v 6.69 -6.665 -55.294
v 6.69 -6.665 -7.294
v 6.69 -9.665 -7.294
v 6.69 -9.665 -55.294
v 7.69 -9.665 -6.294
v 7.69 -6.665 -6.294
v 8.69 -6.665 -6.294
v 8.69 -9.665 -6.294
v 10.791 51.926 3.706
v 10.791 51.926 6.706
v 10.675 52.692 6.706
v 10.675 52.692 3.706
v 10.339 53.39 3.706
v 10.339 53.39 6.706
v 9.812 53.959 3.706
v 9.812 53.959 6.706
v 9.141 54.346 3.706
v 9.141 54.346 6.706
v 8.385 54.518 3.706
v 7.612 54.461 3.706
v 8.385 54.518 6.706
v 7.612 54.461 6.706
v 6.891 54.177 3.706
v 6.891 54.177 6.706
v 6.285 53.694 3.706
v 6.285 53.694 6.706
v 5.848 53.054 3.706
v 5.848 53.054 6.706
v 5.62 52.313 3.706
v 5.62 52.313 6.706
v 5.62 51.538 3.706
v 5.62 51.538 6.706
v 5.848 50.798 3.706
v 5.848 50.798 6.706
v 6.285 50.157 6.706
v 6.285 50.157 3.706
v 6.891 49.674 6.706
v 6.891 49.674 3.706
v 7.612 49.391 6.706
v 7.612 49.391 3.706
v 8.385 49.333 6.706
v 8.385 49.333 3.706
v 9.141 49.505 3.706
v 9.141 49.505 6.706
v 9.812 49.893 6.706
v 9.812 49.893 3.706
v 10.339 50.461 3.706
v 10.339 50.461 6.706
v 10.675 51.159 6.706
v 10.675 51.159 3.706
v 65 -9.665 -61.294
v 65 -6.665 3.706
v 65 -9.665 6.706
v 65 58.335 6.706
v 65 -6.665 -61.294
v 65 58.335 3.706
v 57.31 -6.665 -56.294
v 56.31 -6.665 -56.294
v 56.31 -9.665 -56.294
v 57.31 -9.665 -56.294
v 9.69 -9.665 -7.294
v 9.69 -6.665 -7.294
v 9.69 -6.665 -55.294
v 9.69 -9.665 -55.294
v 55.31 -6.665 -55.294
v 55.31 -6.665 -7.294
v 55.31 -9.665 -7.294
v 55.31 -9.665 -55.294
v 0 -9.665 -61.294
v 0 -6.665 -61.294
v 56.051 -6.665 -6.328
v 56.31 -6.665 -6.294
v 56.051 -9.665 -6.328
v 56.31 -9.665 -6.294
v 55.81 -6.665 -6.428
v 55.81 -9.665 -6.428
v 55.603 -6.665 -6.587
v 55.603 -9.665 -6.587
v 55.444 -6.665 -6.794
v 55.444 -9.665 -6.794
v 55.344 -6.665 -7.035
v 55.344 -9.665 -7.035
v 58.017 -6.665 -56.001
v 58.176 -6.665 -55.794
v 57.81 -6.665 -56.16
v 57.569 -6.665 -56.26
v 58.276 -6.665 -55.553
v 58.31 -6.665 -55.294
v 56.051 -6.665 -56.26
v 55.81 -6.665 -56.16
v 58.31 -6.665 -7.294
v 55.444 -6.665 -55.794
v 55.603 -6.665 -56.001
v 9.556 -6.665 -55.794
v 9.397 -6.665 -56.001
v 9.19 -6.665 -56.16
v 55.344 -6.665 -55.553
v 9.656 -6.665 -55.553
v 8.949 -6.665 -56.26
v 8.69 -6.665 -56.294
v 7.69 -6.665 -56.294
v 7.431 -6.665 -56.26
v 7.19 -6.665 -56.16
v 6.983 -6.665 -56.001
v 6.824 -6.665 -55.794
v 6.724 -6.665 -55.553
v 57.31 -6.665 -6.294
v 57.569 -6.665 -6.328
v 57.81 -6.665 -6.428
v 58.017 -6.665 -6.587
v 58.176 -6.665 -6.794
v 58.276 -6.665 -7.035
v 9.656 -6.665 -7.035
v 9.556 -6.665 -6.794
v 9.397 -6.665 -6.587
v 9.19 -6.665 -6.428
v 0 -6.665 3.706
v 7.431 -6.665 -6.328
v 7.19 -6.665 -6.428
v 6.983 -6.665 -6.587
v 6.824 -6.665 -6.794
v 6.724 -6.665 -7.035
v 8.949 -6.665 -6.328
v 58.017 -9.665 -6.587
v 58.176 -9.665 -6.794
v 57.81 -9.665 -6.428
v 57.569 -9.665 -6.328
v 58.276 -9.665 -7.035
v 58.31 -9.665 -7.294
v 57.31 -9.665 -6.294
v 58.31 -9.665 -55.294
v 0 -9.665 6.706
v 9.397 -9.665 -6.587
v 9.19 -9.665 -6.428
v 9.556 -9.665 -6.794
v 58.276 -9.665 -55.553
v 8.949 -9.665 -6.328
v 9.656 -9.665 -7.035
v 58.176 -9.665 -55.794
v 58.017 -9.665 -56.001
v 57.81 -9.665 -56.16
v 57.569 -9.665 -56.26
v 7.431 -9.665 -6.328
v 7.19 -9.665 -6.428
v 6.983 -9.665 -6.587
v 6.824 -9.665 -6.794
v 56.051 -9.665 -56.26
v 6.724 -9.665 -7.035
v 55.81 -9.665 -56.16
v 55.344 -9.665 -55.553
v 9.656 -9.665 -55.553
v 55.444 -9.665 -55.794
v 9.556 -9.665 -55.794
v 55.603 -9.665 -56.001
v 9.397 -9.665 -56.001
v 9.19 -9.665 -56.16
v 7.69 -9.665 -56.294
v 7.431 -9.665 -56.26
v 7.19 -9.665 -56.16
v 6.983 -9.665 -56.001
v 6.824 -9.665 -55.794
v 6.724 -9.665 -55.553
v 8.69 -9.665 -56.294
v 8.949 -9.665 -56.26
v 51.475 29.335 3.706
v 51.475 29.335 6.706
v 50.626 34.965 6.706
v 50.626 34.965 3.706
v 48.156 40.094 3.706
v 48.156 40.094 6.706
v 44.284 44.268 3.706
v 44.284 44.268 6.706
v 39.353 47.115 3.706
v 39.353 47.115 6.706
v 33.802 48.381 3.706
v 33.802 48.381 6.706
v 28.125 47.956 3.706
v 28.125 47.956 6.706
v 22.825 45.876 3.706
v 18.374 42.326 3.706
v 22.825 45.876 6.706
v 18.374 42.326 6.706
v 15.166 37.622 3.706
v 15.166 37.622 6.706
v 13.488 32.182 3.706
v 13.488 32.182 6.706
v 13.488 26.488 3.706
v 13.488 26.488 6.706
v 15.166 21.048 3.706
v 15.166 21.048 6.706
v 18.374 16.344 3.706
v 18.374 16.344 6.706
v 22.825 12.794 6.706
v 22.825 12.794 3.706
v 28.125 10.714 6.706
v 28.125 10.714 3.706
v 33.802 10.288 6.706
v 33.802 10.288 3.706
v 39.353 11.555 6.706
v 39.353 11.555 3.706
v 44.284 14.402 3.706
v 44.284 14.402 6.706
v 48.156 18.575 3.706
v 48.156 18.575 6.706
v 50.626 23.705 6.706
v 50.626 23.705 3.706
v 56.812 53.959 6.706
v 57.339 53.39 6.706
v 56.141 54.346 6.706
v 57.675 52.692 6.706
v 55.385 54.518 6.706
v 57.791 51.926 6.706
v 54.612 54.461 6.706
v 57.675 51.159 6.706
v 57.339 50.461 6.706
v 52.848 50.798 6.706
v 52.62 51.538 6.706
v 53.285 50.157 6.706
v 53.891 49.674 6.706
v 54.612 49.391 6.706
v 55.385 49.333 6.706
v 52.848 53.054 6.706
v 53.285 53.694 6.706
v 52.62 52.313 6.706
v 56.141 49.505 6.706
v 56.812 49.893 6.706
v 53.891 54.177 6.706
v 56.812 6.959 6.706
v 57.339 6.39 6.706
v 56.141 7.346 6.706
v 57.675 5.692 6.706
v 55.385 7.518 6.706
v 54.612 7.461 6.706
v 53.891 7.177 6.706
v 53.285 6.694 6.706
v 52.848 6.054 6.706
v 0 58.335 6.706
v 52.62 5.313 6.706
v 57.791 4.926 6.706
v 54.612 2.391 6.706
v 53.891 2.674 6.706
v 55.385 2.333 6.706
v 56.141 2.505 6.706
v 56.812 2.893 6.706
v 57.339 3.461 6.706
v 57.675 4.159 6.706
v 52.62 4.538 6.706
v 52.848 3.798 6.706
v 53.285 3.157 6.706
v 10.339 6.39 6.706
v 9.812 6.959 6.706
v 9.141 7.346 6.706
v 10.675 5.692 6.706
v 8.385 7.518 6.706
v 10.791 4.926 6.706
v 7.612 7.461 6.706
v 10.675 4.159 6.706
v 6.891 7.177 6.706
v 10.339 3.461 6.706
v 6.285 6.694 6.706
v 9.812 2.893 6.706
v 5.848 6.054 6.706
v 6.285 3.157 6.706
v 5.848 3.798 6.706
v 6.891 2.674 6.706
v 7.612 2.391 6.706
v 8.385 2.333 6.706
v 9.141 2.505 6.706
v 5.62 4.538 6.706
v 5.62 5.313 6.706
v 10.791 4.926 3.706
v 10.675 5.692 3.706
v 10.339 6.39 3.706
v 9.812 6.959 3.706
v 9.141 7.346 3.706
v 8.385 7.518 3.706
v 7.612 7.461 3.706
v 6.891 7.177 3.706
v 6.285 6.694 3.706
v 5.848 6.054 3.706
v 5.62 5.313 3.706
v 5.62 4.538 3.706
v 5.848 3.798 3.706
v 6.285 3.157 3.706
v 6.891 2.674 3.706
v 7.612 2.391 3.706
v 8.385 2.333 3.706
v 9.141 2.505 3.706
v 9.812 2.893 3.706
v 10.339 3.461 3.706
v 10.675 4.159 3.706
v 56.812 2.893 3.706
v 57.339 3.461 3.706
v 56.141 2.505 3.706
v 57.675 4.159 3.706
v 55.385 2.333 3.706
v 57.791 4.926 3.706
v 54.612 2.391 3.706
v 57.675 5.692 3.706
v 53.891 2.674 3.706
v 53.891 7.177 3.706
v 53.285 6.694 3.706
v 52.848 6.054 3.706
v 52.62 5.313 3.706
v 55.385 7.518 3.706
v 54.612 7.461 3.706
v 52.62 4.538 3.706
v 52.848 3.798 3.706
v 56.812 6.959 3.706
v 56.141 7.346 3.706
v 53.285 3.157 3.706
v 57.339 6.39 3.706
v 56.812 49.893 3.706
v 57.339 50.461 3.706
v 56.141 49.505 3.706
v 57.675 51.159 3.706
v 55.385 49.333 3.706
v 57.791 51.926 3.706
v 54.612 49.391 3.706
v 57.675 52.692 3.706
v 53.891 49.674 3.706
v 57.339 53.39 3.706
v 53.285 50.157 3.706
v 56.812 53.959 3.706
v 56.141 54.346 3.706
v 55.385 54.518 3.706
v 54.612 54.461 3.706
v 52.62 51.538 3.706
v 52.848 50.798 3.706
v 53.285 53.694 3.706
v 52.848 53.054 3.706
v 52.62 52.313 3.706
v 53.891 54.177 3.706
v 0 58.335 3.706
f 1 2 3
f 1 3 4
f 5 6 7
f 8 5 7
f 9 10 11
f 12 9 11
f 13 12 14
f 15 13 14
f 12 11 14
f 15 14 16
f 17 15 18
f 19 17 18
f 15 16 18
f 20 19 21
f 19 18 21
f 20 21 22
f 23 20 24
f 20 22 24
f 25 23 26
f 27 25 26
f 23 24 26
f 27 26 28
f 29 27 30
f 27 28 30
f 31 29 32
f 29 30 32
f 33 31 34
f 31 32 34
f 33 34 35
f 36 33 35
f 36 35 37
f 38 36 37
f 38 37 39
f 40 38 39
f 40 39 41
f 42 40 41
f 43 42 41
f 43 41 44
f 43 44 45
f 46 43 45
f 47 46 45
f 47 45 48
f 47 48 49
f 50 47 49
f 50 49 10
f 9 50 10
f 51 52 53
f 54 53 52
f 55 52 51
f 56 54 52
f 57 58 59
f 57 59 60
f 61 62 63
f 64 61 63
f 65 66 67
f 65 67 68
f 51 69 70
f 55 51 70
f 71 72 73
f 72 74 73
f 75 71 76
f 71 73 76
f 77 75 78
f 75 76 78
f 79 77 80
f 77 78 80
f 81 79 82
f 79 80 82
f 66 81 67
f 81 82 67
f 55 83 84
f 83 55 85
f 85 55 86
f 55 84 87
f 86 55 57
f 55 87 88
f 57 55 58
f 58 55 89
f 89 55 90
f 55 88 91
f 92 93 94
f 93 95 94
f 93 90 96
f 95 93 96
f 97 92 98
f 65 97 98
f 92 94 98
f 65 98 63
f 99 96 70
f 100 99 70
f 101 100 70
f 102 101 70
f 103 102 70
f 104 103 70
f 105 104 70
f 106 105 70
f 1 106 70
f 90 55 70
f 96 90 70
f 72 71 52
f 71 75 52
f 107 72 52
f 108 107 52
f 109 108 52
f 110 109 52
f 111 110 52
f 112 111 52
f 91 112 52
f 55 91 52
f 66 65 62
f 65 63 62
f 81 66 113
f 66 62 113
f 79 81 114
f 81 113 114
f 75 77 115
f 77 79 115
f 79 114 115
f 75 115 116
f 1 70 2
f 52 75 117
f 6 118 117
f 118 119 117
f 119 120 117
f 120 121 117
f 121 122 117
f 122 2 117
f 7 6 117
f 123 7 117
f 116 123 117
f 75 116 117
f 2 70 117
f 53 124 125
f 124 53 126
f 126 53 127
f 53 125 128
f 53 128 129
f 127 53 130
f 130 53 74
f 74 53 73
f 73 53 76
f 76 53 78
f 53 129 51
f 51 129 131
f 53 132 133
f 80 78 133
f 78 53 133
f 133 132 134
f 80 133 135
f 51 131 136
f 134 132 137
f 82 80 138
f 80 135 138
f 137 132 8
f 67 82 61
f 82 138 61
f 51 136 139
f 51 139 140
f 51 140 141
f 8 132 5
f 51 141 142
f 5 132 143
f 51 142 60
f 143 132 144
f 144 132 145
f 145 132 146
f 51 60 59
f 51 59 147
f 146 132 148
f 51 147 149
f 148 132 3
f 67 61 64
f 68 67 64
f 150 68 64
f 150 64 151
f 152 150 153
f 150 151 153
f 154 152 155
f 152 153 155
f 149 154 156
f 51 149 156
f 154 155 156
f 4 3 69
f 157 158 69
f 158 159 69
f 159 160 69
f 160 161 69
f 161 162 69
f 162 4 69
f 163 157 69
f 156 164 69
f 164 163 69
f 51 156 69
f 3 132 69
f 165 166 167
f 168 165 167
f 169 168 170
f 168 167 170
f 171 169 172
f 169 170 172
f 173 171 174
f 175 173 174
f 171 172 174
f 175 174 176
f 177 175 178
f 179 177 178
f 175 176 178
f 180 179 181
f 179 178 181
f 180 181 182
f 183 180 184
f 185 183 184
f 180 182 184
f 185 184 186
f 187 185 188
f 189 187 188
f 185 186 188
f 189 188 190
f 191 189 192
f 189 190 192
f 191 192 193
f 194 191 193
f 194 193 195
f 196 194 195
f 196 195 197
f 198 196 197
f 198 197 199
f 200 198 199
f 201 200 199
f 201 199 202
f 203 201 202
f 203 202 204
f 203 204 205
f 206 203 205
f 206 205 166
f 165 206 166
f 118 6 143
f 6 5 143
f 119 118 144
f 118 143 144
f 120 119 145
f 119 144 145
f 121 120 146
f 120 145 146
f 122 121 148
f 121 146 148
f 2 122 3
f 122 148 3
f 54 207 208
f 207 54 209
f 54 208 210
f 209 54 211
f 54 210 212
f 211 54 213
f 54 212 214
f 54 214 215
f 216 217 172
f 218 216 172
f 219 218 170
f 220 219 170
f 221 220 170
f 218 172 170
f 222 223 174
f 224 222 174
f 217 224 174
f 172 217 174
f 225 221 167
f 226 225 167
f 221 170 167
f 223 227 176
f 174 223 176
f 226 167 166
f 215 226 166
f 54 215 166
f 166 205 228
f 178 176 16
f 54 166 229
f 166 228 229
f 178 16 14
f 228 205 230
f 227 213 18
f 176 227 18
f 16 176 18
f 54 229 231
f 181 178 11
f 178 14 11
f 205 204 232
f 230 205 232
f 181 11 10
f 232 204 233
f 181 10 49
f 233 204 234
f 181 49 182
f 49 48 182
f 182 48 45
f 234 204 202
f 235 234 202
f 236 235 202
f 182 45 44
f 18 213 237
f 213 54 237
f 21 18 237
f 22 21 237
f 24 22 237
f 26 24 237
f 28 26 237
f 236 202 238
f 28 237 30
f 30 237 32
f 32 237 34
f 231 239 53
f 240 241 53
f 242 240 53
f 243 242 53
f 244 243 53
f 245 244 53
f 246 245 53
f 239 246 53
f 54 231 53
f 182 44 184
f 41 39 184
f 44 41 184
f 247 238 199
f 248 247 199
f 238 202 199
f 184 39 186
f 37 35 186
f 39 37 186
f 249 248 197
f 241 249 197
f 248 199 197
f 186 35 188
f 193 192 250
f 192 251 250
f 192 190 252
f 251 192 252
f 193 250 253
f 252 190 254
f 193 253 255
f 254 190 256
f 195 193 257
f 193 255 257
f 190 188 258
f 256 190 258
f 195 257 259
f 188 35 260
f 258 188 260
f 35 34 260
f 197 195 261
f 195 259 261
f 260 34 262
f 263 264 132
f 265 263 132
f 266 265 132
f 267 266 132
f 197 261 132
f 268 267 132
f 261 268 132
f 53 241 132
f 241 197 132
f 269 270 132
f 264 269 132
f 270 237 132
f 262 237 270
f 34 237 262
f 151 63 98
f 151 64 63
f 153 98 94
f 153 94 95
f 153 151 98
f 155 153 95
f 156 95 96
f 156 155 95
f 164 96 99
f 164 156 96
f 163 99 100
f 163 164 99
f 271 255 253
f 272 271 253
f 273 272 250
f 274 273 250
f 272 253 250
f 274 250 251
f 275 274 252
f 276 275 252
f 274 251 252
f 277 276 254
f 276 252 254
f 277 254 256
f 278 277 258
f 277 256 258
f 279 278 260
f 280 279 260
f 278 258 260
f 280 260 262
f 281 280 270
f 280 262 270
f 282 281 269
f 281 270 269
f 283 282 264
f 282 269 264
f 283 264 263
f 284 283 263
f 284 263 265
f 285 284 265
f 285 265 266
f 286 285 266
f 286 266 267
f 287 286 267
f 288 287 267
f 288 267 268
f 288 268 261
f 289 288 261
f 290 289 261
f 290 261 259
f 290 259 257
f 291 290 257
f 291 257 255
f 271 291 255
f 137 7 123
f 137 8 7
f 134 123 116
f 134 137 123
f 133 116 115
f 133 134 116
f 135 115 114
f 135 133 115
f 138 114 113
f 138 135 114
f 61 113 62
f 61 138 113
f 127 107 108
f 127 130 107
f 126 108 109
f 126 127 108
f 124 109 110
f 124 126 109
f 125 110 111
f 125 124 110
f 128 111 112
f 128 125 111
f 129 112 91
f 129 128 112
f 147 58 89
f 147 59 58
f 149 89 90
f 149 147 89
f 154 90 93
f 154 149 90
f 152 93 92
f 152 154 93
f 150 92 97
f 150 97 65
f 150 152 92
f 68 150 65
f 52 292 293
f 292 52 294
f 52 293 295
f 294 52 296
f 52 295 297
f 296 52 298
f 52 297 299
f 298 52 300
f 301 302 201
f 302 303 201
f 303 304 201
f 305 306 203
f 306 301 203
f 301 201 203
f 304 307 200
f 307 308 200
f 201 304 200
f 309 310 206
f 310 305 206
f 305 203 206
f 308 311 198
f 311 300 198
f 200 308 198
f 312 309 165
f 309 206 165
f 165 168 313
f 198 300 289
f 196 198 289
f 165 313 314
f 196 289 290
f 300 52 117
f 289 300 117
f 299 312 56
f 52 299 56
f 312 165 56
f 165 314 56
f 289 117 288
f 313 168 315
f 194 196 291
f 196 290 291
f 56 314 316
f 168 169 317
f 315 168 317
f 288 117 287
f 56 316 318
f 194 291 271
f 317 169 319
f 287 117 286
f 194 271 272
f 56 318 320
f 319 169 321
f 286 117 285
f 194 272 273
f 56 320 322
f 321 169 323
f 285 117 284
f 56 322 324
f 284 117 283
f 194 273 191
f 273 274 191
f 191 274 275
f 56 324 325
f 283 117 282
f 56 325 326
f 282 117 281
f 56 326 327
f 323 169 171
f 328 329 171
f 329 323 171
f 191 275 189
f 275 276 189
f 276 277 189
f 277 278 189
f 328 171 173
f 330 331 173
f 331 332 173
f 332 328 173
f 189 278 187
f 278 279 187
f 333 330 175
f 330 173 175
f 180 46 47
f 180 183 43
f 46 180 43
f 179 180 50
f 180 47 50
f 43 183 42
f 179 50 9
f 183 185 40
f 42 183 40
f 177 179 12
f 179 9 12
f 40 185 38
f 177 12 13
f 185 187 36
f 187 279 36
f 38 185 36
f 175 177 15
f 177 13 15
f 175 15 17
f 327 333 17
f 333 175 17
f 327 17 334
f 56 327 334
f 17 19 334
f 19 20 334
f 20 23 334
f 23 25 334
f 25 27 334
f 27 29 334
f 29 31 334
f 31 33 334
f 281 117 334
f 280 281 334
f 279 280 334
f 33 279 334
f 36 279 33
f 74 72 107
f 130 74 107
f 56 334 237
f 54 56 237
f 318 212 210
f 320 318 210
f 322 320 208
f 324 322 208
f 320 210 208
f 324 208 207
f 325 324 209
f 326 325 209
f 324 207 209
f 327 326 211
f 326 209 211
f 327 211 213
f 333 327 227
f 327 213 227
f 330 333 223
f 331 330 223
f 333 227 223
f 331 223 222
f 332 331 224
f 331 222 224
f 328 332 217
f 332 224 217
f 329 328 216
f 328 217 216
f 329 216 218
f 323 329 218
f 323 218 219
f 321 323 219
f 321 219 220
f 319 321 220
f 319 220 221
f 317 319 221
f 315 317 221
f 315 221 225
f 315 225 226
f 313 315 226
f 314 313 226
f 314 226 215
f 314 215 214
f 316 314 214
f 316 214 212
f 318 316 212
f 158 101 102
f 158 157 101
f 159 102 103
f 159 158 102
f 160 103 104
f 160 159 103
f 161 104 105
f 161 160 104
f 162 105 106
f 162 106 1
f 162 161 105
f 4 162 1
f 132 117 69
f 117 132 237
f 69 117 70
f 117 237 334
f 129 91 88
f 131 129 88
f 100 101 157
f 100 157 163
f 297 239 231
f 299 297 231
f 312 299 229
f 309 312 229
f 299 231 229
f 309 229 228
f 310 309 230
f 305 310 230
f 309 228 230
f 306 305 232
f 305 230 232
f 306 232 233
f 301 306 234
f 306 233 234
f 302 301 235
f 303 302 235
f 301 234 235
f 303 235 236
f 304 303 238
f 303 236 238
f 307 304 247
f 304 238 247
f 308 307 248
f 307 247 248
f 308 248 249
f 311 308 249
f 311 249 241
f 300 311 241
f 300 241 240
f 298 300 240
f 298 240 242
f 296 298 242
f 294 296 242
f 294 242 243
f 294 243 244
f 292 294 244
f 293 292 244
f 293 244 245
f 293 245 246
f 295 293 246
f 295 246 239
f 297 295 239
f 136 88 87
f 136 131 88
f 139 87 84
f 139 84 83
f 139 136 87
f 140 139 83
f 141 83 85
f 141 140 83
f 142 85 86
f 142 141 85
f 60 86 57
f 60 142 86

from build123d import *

# Parameters (mm, degrees)
EXTRUDE_1_DEPTH     = 65
SKETCH_2_R          = 19.1
SKETCH_2_R_2        = 2.6
CUT_EXTRUDE_1_DEPTH = 65
SKETCH_3_W          = 3
SKETCH_3_H          = 50
CUT_EXTRUDE_2_DEPTH = 10
FILLET_1_R          = 1


with BuildPart() as part:
    # 草图1 → 凸台-拉伸1 (new body)
    with BuildSketch(Plane(origin=(0, 0, 0), x_dir=(0, 0, -1), z_dir=(1, 0, 0))):
        Polygon((-6.706172895, 58.33487067), (-6.706172895, -9.66512933), (61.293827105, -9.66512933), (61.293827105, -6.66512933), (-3.706172895, -6.66512933), (-3.706172895, 58.33487067), align=None)
    extrude(amount=EXTRUDE_1_DEPTH)

    # 草图2 → 切除-拉伸1 (cut)
    with BuildSketch(Plane.XY.offset(6.706172895)):
        with Locations((32.374981494, 29.33487067)):
            Circle(SKETCH_2_R)
        with Locations((8.190858784, 51.925747661)):
            Circle(SKETCH_2_R_2)
        with Locations((55.190858784, 51.925747661)):
            Circle(SKETCH_2_R_2)
        with Locations((8.190858784, 4.925747661)):
            Circle(SKETCH_2_R_2)
        with Locations((55.190858784, 4.925747661)):
            Circle(SKETCH_2_R_2)
    extrude(amount=-CUT_EXTRUDE_1_DEPTH, mode=Mode.SUBTRACT)

    # 草图3 → 切除-拉伸2 (cut)
    with BuildSketch(Plane(origin=(0, -6.66512933, 0), x_dir=(1, 0, 0), z_dir=(0, 1, 0))):
        with Locations((8.19, 31.293827105)):
            Rectangle(SKETCH_3_W, SKETCH_3_H)
        with Locations((56.81, 31.293827105)):
            Rectangle(SKETCH_3_W, SKETCH_3_H)
    extrude(amount=-CUT_EXTRUDE_2_DEPTH, mode=Mode.SUBTRACT)

    # 圆角1
    fillet_1_edges = [part.edges().sort_by_distance(p)[0] for p in [
        (6.69, -8.16512933, -6.293827105),
        (6.69, -8.16512933, -56.293827105),
        (9.69, -8.16512933, -56.293827105),
        (9.69, -8.16512933, -6.293827105),
        (55.31, -8.16512933, -6.293827105),
        (55.31, -8.16512933, -56.293827105),
        (58.31, -8.16512933, -56.293827105),
        (58.31, -8.16512933, -6.293827105),
    ]]
    fillet(fillet_1_edges, radius=FILLET_1_R)


solid = part.part
